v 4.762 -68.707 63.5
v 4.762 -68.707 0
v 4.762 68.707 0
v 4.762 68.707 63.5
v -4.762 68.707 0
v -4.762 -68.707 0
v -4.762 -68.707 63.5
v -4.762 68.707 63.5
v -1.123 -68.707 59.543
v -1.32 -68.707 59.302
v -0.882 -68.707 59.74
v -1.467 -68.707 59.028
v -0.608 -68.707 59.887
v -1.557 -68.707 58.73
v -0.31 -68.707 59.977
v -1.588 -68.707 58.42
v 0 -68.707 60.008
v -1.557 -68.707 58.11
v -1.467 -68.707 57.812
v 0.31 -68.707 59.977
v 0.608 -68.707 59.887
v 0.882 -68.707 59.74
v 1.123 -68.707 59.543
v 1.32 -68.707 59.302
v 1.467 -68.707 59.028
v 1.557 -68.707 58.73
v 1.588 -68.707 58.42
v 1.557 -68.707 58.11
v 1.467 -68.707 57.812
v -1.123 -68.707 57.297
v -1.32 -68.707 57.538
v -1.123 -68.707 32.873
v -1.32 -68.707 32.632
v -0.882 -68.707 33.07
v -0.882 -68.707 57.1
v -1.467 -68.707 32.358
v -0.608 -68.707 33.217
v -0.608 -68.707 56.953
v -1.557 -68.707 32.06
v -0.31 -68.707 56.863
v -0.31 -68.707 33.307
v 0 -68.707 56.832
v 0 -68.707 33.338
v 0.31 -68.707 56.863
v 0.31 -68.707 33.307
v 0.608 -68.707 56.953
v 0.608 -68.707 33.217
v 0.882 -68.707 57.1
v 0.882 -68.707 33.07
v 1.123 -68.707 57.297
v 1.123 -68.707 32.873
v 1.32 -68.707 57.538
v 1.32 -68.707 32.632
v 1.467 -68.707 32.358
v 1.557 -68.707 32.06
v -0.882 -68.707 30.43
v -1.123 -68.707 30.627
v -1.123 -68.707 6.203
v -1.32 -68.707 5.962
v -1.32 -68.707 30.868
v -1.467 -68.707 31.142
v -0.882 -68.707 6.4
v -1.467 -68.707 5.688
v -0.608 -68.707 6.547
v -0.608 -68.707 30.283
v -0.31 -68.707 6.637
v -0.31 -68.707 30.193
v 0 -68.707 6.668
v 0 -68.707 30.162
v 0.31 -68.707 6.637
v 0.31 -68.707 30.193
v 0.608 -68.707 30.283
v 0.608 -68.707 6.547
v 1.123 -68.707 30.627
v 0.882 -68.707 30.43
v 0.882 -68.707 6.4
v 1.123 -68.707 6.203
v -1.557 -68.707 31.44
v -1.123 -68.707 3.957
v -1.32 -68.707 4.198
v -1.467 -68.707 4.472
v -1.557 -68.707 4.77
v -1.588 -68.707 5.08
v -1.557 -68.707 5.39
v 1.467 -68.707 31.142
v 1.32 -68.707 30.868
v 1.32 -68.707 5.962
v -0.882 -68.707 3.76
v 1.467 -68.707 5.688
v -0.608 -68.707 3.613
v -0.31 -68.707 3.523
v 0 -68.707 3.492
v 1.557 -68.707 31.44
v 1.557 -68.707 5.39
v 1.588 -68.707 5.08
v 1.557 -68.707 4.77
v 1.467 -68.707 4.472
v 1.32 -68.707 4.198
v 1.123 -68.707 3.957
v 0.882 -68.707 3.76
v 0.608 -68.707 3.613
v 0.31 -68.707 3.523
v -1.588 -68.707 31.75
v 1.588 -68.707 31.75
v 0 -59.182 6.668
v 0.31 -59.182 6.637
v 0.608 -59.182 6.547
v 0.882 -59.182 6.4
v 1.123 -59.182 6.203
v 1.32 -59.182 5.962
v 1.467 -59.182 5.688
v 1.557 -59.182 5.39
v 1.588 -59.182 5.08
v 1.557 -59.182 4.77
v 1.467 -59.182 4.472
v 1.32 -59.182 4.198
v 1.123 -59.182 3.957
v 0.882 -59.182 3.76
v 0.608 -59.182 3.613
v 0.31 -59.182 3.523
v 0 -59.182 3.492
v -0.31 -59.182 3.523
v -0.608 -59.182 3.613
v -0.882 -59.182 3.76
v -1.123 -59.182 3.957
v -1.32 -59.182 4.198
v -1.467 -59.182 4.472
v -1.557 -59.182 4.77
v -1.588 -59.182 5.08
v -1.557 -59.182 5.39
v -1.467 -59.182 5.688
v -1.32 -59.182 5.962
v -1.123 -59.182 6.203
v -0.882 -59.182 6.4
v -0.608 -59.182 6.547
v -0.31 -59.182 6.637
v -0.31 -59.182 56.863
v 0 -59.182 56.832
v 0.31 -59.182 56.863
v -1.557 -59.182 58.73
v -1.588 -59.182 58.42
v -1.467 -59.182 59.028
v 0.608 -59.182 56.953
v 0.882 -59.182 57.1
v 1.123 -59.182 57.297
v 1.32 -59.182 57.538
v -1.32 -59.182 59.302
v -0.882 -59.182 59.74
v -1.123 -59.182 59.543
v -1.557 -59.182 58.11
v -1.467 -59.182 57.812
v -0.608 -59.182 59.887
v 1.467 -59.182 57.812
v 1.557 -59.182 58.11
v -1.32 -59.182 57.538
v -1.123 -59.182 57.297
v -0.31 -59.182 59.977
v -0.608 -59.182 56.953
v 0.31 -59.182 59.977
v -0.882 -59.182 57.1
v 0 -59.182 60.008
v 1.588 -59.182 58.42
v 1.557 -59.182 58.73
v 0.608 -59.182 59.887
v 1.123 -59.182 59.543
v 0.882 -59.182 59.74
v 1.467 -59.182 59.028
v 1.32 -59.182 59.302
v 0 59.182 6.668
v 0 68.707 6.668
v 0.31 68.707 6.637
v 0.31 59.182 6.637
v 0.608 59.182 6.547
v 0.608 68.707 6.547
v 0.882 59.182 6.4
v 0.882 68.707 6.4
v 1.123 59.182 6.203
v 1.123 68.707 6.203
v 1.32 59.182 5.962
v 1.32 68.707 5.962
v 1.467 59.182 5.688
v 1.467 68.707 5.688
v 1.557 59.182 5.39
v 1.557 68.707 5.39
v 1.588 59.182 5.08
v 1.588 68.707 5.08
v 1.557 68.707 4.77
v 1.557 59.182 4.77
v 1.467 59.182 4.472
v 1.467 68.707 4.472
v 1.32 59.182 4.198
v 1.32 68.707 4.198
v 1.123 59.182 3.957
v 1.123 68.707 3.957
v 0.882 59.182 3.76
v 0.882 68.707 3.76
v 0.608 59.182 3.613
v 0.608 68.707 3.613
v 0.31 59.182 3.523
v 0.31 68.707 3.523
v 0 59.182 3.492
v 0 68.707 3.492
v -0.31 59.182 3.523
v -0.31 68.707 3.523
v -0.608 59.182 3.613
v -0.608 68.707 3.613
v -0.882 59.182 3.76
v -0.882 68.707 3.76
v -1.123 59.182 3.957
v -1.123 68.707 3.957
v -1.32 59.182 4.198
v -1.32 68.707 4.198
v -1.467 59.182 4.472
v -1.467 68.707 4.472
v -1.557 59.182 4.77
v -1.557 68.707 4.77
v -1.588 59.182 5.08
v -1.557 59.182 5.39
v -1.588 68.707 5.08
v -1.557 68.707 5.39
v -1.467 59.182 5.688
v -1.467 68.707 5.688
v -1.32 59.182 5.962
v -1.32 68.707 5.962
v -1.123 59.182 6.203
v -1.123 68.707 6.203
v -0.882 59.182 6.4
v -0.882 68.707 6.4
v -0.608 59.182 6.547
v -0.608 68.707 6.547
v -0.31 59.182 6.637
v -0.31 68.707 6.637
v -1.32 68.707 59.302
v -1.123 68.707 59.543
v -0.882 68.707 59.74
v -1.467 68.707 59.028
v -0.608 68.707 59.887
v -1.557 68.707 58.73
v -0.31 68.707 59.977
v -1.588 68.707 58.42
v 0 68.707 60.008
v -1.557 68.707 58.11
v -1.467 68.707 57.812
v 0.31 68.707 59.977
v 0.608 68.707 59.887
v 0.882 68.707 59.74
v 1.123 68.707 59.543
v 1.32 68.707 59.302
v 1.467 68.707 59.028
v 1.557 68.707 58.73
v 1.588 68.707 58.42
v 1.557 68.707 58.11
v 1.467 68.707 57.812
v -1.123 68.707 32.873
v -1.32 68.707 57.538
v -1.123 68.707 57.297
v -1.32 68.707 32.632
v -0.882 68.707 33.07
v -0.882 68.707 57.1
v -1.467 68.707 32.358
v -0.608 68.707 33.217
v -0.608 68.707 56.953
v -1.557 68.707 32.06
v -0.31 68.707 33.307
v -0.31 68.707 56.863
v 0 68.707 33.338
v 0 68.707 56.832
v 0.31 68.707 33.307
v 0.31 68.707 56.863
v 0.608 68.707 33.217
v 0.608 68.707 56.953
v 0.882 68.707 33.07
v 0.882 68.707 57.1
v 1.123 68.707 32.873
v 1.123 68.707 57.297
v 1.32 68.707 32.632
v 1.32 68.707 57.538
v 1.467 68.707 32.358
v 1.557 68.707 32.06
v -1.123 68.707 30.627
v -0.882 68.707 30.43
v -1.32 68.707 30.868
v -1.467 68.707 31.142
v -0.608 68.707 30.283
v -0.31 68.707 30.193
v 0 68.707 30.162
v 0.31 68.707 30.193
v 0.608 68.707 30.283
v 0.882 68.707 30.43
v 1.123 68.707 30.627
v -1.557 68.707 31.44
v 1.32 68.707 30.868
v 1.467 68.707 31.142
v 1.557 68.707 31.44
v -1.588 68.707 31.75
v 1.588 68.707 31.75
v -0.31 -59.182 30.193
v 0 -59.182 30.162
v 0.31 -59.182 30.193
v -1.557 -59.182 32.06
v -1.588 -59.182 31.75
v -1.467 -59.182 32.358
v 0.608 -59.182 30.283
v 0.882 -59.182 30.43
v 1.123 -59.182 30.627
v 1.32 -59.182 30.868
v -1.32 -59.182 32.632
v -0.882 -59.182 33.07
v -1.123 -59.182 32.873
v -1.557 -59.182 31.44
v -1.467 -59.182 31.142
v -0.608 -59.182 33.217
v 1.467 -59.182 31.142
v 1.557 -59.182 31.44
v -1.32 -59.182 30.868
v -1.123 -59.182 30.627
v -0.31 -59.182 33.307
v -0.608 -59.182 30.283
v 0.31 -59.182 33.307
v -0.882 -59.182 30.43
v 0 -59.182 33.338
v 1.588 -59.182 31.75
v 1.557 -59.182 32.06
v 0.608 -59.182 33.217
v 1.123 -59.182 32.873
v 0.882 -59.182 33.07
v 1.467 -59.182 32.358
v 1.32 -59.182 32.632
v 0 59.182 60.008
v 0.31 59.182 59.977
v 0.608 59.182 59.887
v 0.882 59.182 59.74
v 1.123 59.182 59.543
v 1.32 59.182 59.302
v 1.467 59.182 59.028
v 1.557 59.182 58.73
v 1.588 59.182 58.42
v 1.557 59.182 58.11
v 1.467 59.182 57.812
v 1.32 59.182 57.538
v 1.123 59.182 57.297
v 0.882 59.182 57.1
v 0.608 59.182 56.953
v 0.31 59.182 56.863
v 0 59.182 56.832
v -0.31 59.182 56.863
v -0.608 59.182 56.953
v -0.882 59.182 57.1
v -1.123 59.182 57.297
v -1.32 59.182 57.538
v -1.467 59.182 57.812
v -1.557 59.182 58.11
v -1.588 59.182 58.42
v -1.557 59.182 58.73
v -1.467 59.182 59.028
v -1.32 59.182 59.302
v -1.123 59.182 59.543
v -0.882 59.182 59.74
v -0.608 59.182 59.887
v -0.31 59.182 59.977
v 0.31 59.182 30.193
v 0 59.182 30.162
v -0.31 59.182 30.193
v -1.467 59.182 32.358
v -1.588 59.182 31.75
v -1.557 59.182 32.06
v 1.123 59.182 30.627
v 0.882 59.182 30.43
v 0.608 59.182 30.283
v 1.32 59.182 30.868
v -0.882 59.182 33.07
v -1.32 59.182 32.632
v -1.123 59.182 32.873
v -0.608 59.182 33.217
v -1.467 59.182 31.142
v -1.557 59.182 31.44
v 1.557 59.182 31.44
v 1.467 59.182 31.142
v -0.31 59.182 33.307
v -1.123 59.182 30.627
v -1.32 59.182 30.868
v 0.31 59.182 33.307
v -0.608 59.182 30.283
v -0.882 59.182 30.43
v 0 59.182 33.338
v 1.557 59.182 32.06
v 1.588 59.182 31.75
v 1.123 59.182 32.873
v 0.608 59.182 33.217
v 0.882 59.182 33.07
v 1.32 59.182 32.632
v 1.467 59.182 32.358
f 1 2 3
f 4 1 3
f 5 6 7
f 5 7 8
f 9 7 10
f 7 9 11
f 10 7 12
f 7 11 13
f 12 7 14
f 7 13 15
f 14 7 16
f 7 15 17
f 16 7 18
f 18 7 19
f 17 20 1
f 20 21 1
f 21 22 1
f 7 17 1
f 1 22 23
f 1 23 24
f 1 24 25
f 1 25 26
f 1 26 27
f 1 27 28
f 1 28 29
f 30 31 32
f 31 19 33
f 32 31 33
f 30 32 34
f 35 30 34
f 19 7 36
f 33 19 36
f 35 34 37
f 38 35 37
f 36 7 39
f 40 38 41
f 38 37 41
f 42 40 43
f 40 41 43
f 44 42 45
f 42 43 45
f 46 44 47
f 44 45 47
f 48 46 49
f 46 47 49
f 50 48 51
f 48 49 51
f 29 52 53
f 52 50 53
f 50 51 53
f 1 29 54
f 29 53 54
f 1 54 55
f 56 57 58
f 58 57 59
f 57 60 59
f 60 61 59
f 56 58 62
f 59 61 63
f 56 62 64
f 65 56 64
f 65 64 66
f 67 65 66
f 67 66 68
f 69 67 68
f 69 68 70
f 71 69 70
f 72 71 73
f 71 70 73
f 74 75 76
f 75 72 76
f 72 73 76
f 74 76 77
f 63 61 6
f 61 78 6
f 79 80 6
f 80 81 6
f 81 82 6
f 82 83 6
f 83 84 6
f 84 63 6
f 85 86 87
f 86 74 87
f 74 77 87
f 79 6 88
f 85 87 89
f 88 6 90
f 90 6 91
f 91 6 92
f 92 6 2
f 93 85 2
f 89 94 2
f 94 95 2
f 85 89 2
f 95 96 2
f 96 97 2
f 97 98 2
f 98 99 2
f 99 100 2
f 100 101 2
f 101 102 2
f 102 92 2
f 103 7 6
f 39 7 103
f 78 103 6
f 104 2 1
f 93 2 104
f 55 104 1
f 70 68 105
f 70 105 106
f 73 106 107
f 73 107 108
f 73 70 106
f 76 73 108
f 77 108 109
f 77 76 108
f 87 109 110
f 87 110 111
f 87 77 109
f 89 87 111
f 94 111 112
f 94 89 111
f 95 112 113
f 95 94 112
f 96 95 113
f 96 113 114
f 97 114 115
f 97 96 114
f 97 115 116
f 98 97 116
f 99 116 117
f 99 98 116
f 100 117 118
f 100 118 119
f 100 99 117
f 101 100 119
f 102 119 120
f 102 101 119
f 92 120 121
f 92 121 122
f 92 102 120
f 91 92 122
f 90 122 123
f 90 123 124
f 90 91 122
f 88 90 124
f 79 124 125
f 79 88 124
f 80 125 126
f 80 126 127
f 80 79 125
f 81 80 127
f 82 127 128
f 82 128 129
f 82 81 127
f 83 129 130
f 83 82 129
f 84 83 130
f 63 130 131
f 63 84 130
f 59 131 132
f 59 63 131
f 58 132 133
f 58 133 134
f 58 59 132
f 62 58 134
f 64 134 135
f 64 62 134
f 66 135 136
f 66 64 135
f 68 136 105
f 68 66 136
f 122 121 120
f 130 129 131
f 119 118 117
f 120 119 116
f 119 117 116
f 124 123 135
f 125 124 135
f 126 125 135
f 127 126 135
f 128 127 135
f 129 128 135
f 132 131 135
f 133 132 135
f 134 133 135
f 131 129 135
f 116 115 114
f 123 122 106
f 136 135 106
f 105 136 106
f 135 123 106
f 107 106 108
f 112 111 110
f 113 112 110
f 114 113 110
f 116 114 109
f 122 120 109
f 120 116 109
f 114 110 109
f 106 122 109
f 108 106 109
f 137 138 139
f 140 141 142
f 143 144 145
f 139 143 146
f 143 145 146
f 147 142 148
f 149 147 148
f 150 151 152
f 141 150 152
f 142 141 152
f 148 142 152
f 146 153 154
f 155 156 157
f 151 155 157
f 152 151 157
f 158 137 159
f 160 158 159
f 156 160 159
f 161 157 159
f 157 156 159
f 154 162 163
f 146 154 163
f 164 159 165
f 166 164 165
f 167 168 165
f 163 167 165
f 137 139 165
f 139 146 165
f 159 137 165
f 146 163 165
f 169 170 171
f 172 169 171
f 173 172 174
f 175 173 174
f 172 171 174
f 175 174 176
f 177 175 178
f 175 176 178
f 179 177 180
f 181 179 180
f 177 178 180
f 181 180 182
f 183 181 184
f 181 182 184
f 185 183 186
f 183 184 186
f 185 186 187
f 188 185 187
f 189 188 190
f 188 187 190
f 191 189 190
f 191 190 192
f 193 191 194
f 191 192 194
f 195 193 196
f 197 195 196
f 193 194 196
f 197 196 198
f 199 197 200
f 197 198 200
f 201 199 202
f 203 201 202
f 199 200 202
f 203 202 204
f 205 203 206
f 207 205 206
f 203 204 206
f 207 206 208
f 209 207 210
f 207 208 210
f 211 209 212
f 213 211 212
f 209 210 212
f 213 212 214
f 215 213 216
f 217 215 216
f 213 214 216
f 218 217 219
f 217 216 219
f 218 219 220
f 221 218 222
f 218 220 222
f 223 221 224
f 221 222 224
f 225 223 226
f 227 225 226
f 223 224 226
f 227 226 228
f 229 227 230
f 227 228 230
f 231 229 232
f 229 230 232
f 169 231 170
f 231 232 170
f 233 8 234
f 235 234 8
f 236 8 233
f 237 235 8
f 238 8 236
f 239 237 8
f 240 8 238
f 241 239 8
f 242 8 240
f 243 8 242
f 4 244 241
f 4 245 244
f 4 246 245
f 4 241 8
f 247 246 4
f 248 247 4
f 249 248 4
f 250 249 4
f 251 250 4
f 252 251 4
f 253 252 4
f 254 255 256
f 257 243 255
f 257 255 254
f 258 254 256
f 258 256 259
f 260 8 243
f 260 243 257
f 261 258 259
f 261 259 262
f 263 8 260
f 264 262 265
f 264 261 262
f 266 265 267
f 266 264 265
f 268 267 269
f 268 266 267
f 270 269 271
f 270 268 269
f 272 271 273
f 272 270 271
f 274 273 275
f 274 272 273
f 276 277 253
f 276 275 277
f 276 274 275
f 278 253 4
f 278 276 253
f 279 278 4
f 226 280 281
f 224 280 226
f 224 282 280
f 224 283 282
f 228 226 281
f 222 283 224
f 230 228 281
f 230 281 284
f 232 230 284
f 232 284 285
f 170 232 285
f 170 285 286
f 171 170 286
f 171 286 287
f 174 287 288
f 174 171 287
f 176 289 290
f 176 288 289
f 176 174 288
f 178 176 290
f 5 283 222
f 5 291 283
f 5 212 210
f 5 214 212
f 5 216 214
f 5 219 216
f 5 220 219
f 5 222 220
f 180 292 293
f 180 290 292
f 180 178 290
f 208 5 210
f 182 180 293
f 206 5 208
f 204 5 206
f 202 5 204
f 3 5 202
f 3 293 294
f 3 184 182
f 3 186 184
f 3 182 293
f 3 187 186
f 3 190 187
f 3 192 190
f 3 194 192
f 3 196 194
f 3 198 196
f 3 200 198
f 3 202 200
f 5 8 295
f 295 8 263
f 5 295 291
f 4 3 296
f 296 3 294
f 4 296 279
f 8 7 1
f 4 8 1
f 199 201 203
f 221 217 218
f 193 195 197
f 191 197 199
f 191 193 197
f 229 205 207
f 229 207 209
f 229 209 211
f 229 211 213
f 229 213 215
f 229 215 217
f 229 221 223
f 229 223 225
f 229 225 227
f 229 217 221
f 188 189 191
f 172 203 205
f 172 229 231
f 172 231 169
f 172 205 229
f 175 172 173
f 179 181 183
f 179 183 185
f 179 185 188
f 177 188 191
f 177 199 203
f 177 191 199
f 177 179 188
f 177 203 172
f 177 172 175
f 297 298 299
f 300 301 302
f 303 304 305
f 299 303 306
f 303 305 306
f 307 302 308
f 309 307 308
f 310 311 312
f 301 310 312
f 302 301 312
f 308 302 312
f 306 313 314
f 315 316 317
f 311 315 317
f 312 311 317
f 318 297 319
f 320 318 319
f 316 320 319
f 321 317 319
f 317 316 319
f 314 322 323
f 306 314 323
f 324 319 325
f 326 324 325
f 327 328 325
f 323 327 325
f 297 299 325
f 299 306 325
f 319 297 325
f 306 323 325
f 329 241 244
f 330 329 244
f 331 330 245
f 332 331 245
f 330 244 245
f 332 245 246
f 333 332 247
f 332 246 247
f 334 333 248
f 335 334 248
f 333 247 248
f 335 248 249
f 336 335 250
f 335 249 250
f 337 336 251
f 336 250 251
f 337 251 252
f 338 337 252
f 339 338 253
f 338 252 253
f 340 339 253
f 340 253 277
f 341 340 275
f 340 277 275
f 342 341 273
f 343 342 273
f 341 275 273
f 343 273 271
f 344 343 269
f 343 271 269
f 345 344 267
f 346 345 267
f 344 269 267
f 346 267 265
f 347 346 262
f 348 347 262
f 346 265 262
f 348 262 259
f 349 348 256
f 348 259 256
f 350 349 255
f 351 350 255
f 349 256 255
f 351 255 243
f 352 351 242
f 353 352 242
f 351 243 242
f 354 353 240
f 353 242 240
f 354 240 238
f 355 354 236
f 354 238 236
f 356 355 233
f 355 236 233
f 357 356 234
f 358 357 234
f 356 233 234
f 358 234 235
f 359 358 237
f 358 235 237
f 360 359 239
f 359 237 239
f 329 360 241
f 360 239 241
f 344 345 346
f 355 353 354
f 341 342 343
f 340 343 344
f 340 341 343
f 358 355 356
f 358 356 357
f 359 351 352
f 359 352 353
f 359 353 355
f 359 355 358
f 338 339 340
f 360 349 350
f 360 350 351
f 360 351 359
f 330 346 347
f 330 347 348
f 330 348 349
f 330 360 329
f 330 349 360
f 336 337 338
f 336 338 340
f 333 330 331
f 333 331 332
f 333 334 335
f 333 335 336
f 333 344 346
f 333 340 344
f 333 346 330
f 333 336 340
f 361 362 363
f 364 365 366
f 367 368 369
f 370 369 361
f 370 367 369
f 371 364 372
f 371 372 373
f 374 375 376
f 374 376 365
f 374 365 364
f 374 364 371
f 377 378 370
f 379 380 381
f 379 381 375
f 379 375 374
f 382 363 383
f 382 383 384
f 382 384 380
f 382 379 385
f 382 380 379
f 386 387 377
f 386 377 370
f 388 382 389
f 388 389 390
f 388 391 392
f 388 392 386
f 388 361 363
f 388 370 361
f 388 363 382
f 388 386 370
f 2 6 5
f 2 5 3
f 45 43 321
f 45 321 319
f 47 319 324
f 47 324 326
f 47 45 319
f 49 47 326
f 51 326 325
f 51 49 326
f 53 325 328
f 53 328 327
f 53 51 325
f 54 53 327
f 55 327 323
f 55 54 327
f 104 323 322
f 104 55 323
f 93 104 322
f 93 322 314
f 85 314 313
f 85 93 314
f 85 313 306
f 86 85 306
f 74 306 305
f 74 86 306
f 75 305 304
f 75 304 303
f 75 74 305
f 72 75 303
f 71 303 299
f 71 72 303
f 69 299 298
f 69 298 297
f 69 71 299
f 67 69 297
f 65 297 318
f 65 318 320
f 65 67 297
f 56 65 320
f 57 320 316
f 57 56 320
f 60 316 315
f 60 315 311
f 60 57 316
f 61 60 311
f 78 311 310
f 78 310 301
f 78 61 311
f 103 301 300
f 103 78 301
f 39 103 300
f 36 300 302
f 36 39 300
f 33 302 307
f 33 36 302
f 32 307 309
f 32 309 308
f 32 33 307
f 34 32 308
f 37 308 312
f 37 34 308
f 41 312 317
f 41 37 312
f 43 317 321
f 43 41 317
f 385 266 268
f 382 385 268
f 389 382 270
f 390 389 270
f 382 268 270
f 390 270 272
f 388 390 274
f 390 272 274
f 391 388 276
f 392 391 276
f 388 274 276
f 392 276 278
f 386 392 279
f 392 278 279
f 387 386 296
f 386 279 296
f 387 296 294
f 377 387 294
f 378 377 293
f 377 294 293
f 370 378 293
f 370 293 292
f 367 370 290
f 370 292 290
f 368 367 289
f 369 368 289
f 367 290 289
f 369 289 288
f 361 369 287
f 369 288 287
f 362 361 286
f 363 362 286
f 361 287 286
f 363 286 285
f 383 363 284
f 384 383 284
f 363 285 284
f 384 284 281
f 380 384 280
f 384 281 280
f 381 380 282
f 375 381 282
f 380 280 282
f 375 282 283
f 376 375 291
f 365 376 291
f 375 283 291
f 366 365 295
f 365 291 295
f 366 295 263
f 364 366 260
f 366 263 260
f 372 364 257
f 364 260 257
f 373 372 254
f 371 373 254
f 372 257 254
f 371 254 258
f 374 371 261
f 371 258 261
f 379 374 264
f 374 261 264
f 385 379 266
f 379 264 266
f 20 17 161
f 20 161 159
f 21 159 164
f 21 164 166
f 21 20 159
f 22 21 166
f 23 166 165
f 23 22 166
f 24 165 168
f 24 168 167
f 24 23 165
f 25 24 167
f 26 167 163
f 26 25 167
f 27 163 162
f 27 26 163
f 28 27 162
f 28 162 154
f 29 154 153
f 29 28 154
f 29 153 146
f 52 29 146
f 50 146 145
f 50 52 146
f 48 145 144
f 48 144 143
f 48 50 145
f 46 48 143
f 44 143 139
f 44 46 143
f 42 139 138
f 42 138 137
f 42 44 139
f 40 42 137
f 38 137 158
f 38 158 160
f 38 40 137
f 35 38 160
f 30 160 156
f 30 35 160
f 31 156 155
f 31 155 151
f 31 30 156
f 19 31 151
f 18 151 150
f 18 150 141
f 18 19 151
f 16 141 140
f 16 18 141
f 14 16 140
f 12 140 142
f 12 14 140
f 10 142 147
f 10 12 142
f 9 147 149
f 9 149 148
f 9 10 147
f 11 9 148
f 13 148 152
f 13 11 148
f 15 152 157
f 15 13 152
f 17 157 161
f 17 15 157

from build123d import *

# Parameters (mm, degrees)
SKETCH1_W           = 9.525
SKETCH1_H           = 137.414
BOSS_EXTRUDE1_DEPTH = 63.5
SKETCH2_R           = 1.5875
CUT_EXTRUDE1_DEPTH  = 9.525


with BuildPart() as part:
    # Sketch1 → Boss-Extrude1 (new body)
    with BuildSketch(Plane.XY):
        Rectangle(SKETCH1_W, SKETCH1_H)
    extrude(amount=BOSS_EXTRUDE1_DEPTH)

    # Sketch2 → Cut-Extrude1 (cut)
    with BuildSketch(Plane(origin=(0, 68.707, 0), x_dir=(1, 0, 0), z_dir=(0, 1, 0))):
        with Locations(Location((0, -5.08, 0), (0, 0, 270))):
            Circle(SKETCH2_R)
        with Locations(Location((0, -31.75, 0), (0, 0, 270))):
            Circle(SKETCH2_R)
        with Locations(Location((0, -58.42, 0), (0, 0, 270))):
            Circle(SKETCH2_R)
    cut_extrude1 = extrude(amount=-CUT_EXTRUDE1_DEPTH, mode=Mode.SUBTRACT)

    # Mirror1: Cut-Extrude1 across plane
    add(cut_extrude1.mirror(Plane.ZX), mode=Mode.SUBTRACT)


solid = part.part
